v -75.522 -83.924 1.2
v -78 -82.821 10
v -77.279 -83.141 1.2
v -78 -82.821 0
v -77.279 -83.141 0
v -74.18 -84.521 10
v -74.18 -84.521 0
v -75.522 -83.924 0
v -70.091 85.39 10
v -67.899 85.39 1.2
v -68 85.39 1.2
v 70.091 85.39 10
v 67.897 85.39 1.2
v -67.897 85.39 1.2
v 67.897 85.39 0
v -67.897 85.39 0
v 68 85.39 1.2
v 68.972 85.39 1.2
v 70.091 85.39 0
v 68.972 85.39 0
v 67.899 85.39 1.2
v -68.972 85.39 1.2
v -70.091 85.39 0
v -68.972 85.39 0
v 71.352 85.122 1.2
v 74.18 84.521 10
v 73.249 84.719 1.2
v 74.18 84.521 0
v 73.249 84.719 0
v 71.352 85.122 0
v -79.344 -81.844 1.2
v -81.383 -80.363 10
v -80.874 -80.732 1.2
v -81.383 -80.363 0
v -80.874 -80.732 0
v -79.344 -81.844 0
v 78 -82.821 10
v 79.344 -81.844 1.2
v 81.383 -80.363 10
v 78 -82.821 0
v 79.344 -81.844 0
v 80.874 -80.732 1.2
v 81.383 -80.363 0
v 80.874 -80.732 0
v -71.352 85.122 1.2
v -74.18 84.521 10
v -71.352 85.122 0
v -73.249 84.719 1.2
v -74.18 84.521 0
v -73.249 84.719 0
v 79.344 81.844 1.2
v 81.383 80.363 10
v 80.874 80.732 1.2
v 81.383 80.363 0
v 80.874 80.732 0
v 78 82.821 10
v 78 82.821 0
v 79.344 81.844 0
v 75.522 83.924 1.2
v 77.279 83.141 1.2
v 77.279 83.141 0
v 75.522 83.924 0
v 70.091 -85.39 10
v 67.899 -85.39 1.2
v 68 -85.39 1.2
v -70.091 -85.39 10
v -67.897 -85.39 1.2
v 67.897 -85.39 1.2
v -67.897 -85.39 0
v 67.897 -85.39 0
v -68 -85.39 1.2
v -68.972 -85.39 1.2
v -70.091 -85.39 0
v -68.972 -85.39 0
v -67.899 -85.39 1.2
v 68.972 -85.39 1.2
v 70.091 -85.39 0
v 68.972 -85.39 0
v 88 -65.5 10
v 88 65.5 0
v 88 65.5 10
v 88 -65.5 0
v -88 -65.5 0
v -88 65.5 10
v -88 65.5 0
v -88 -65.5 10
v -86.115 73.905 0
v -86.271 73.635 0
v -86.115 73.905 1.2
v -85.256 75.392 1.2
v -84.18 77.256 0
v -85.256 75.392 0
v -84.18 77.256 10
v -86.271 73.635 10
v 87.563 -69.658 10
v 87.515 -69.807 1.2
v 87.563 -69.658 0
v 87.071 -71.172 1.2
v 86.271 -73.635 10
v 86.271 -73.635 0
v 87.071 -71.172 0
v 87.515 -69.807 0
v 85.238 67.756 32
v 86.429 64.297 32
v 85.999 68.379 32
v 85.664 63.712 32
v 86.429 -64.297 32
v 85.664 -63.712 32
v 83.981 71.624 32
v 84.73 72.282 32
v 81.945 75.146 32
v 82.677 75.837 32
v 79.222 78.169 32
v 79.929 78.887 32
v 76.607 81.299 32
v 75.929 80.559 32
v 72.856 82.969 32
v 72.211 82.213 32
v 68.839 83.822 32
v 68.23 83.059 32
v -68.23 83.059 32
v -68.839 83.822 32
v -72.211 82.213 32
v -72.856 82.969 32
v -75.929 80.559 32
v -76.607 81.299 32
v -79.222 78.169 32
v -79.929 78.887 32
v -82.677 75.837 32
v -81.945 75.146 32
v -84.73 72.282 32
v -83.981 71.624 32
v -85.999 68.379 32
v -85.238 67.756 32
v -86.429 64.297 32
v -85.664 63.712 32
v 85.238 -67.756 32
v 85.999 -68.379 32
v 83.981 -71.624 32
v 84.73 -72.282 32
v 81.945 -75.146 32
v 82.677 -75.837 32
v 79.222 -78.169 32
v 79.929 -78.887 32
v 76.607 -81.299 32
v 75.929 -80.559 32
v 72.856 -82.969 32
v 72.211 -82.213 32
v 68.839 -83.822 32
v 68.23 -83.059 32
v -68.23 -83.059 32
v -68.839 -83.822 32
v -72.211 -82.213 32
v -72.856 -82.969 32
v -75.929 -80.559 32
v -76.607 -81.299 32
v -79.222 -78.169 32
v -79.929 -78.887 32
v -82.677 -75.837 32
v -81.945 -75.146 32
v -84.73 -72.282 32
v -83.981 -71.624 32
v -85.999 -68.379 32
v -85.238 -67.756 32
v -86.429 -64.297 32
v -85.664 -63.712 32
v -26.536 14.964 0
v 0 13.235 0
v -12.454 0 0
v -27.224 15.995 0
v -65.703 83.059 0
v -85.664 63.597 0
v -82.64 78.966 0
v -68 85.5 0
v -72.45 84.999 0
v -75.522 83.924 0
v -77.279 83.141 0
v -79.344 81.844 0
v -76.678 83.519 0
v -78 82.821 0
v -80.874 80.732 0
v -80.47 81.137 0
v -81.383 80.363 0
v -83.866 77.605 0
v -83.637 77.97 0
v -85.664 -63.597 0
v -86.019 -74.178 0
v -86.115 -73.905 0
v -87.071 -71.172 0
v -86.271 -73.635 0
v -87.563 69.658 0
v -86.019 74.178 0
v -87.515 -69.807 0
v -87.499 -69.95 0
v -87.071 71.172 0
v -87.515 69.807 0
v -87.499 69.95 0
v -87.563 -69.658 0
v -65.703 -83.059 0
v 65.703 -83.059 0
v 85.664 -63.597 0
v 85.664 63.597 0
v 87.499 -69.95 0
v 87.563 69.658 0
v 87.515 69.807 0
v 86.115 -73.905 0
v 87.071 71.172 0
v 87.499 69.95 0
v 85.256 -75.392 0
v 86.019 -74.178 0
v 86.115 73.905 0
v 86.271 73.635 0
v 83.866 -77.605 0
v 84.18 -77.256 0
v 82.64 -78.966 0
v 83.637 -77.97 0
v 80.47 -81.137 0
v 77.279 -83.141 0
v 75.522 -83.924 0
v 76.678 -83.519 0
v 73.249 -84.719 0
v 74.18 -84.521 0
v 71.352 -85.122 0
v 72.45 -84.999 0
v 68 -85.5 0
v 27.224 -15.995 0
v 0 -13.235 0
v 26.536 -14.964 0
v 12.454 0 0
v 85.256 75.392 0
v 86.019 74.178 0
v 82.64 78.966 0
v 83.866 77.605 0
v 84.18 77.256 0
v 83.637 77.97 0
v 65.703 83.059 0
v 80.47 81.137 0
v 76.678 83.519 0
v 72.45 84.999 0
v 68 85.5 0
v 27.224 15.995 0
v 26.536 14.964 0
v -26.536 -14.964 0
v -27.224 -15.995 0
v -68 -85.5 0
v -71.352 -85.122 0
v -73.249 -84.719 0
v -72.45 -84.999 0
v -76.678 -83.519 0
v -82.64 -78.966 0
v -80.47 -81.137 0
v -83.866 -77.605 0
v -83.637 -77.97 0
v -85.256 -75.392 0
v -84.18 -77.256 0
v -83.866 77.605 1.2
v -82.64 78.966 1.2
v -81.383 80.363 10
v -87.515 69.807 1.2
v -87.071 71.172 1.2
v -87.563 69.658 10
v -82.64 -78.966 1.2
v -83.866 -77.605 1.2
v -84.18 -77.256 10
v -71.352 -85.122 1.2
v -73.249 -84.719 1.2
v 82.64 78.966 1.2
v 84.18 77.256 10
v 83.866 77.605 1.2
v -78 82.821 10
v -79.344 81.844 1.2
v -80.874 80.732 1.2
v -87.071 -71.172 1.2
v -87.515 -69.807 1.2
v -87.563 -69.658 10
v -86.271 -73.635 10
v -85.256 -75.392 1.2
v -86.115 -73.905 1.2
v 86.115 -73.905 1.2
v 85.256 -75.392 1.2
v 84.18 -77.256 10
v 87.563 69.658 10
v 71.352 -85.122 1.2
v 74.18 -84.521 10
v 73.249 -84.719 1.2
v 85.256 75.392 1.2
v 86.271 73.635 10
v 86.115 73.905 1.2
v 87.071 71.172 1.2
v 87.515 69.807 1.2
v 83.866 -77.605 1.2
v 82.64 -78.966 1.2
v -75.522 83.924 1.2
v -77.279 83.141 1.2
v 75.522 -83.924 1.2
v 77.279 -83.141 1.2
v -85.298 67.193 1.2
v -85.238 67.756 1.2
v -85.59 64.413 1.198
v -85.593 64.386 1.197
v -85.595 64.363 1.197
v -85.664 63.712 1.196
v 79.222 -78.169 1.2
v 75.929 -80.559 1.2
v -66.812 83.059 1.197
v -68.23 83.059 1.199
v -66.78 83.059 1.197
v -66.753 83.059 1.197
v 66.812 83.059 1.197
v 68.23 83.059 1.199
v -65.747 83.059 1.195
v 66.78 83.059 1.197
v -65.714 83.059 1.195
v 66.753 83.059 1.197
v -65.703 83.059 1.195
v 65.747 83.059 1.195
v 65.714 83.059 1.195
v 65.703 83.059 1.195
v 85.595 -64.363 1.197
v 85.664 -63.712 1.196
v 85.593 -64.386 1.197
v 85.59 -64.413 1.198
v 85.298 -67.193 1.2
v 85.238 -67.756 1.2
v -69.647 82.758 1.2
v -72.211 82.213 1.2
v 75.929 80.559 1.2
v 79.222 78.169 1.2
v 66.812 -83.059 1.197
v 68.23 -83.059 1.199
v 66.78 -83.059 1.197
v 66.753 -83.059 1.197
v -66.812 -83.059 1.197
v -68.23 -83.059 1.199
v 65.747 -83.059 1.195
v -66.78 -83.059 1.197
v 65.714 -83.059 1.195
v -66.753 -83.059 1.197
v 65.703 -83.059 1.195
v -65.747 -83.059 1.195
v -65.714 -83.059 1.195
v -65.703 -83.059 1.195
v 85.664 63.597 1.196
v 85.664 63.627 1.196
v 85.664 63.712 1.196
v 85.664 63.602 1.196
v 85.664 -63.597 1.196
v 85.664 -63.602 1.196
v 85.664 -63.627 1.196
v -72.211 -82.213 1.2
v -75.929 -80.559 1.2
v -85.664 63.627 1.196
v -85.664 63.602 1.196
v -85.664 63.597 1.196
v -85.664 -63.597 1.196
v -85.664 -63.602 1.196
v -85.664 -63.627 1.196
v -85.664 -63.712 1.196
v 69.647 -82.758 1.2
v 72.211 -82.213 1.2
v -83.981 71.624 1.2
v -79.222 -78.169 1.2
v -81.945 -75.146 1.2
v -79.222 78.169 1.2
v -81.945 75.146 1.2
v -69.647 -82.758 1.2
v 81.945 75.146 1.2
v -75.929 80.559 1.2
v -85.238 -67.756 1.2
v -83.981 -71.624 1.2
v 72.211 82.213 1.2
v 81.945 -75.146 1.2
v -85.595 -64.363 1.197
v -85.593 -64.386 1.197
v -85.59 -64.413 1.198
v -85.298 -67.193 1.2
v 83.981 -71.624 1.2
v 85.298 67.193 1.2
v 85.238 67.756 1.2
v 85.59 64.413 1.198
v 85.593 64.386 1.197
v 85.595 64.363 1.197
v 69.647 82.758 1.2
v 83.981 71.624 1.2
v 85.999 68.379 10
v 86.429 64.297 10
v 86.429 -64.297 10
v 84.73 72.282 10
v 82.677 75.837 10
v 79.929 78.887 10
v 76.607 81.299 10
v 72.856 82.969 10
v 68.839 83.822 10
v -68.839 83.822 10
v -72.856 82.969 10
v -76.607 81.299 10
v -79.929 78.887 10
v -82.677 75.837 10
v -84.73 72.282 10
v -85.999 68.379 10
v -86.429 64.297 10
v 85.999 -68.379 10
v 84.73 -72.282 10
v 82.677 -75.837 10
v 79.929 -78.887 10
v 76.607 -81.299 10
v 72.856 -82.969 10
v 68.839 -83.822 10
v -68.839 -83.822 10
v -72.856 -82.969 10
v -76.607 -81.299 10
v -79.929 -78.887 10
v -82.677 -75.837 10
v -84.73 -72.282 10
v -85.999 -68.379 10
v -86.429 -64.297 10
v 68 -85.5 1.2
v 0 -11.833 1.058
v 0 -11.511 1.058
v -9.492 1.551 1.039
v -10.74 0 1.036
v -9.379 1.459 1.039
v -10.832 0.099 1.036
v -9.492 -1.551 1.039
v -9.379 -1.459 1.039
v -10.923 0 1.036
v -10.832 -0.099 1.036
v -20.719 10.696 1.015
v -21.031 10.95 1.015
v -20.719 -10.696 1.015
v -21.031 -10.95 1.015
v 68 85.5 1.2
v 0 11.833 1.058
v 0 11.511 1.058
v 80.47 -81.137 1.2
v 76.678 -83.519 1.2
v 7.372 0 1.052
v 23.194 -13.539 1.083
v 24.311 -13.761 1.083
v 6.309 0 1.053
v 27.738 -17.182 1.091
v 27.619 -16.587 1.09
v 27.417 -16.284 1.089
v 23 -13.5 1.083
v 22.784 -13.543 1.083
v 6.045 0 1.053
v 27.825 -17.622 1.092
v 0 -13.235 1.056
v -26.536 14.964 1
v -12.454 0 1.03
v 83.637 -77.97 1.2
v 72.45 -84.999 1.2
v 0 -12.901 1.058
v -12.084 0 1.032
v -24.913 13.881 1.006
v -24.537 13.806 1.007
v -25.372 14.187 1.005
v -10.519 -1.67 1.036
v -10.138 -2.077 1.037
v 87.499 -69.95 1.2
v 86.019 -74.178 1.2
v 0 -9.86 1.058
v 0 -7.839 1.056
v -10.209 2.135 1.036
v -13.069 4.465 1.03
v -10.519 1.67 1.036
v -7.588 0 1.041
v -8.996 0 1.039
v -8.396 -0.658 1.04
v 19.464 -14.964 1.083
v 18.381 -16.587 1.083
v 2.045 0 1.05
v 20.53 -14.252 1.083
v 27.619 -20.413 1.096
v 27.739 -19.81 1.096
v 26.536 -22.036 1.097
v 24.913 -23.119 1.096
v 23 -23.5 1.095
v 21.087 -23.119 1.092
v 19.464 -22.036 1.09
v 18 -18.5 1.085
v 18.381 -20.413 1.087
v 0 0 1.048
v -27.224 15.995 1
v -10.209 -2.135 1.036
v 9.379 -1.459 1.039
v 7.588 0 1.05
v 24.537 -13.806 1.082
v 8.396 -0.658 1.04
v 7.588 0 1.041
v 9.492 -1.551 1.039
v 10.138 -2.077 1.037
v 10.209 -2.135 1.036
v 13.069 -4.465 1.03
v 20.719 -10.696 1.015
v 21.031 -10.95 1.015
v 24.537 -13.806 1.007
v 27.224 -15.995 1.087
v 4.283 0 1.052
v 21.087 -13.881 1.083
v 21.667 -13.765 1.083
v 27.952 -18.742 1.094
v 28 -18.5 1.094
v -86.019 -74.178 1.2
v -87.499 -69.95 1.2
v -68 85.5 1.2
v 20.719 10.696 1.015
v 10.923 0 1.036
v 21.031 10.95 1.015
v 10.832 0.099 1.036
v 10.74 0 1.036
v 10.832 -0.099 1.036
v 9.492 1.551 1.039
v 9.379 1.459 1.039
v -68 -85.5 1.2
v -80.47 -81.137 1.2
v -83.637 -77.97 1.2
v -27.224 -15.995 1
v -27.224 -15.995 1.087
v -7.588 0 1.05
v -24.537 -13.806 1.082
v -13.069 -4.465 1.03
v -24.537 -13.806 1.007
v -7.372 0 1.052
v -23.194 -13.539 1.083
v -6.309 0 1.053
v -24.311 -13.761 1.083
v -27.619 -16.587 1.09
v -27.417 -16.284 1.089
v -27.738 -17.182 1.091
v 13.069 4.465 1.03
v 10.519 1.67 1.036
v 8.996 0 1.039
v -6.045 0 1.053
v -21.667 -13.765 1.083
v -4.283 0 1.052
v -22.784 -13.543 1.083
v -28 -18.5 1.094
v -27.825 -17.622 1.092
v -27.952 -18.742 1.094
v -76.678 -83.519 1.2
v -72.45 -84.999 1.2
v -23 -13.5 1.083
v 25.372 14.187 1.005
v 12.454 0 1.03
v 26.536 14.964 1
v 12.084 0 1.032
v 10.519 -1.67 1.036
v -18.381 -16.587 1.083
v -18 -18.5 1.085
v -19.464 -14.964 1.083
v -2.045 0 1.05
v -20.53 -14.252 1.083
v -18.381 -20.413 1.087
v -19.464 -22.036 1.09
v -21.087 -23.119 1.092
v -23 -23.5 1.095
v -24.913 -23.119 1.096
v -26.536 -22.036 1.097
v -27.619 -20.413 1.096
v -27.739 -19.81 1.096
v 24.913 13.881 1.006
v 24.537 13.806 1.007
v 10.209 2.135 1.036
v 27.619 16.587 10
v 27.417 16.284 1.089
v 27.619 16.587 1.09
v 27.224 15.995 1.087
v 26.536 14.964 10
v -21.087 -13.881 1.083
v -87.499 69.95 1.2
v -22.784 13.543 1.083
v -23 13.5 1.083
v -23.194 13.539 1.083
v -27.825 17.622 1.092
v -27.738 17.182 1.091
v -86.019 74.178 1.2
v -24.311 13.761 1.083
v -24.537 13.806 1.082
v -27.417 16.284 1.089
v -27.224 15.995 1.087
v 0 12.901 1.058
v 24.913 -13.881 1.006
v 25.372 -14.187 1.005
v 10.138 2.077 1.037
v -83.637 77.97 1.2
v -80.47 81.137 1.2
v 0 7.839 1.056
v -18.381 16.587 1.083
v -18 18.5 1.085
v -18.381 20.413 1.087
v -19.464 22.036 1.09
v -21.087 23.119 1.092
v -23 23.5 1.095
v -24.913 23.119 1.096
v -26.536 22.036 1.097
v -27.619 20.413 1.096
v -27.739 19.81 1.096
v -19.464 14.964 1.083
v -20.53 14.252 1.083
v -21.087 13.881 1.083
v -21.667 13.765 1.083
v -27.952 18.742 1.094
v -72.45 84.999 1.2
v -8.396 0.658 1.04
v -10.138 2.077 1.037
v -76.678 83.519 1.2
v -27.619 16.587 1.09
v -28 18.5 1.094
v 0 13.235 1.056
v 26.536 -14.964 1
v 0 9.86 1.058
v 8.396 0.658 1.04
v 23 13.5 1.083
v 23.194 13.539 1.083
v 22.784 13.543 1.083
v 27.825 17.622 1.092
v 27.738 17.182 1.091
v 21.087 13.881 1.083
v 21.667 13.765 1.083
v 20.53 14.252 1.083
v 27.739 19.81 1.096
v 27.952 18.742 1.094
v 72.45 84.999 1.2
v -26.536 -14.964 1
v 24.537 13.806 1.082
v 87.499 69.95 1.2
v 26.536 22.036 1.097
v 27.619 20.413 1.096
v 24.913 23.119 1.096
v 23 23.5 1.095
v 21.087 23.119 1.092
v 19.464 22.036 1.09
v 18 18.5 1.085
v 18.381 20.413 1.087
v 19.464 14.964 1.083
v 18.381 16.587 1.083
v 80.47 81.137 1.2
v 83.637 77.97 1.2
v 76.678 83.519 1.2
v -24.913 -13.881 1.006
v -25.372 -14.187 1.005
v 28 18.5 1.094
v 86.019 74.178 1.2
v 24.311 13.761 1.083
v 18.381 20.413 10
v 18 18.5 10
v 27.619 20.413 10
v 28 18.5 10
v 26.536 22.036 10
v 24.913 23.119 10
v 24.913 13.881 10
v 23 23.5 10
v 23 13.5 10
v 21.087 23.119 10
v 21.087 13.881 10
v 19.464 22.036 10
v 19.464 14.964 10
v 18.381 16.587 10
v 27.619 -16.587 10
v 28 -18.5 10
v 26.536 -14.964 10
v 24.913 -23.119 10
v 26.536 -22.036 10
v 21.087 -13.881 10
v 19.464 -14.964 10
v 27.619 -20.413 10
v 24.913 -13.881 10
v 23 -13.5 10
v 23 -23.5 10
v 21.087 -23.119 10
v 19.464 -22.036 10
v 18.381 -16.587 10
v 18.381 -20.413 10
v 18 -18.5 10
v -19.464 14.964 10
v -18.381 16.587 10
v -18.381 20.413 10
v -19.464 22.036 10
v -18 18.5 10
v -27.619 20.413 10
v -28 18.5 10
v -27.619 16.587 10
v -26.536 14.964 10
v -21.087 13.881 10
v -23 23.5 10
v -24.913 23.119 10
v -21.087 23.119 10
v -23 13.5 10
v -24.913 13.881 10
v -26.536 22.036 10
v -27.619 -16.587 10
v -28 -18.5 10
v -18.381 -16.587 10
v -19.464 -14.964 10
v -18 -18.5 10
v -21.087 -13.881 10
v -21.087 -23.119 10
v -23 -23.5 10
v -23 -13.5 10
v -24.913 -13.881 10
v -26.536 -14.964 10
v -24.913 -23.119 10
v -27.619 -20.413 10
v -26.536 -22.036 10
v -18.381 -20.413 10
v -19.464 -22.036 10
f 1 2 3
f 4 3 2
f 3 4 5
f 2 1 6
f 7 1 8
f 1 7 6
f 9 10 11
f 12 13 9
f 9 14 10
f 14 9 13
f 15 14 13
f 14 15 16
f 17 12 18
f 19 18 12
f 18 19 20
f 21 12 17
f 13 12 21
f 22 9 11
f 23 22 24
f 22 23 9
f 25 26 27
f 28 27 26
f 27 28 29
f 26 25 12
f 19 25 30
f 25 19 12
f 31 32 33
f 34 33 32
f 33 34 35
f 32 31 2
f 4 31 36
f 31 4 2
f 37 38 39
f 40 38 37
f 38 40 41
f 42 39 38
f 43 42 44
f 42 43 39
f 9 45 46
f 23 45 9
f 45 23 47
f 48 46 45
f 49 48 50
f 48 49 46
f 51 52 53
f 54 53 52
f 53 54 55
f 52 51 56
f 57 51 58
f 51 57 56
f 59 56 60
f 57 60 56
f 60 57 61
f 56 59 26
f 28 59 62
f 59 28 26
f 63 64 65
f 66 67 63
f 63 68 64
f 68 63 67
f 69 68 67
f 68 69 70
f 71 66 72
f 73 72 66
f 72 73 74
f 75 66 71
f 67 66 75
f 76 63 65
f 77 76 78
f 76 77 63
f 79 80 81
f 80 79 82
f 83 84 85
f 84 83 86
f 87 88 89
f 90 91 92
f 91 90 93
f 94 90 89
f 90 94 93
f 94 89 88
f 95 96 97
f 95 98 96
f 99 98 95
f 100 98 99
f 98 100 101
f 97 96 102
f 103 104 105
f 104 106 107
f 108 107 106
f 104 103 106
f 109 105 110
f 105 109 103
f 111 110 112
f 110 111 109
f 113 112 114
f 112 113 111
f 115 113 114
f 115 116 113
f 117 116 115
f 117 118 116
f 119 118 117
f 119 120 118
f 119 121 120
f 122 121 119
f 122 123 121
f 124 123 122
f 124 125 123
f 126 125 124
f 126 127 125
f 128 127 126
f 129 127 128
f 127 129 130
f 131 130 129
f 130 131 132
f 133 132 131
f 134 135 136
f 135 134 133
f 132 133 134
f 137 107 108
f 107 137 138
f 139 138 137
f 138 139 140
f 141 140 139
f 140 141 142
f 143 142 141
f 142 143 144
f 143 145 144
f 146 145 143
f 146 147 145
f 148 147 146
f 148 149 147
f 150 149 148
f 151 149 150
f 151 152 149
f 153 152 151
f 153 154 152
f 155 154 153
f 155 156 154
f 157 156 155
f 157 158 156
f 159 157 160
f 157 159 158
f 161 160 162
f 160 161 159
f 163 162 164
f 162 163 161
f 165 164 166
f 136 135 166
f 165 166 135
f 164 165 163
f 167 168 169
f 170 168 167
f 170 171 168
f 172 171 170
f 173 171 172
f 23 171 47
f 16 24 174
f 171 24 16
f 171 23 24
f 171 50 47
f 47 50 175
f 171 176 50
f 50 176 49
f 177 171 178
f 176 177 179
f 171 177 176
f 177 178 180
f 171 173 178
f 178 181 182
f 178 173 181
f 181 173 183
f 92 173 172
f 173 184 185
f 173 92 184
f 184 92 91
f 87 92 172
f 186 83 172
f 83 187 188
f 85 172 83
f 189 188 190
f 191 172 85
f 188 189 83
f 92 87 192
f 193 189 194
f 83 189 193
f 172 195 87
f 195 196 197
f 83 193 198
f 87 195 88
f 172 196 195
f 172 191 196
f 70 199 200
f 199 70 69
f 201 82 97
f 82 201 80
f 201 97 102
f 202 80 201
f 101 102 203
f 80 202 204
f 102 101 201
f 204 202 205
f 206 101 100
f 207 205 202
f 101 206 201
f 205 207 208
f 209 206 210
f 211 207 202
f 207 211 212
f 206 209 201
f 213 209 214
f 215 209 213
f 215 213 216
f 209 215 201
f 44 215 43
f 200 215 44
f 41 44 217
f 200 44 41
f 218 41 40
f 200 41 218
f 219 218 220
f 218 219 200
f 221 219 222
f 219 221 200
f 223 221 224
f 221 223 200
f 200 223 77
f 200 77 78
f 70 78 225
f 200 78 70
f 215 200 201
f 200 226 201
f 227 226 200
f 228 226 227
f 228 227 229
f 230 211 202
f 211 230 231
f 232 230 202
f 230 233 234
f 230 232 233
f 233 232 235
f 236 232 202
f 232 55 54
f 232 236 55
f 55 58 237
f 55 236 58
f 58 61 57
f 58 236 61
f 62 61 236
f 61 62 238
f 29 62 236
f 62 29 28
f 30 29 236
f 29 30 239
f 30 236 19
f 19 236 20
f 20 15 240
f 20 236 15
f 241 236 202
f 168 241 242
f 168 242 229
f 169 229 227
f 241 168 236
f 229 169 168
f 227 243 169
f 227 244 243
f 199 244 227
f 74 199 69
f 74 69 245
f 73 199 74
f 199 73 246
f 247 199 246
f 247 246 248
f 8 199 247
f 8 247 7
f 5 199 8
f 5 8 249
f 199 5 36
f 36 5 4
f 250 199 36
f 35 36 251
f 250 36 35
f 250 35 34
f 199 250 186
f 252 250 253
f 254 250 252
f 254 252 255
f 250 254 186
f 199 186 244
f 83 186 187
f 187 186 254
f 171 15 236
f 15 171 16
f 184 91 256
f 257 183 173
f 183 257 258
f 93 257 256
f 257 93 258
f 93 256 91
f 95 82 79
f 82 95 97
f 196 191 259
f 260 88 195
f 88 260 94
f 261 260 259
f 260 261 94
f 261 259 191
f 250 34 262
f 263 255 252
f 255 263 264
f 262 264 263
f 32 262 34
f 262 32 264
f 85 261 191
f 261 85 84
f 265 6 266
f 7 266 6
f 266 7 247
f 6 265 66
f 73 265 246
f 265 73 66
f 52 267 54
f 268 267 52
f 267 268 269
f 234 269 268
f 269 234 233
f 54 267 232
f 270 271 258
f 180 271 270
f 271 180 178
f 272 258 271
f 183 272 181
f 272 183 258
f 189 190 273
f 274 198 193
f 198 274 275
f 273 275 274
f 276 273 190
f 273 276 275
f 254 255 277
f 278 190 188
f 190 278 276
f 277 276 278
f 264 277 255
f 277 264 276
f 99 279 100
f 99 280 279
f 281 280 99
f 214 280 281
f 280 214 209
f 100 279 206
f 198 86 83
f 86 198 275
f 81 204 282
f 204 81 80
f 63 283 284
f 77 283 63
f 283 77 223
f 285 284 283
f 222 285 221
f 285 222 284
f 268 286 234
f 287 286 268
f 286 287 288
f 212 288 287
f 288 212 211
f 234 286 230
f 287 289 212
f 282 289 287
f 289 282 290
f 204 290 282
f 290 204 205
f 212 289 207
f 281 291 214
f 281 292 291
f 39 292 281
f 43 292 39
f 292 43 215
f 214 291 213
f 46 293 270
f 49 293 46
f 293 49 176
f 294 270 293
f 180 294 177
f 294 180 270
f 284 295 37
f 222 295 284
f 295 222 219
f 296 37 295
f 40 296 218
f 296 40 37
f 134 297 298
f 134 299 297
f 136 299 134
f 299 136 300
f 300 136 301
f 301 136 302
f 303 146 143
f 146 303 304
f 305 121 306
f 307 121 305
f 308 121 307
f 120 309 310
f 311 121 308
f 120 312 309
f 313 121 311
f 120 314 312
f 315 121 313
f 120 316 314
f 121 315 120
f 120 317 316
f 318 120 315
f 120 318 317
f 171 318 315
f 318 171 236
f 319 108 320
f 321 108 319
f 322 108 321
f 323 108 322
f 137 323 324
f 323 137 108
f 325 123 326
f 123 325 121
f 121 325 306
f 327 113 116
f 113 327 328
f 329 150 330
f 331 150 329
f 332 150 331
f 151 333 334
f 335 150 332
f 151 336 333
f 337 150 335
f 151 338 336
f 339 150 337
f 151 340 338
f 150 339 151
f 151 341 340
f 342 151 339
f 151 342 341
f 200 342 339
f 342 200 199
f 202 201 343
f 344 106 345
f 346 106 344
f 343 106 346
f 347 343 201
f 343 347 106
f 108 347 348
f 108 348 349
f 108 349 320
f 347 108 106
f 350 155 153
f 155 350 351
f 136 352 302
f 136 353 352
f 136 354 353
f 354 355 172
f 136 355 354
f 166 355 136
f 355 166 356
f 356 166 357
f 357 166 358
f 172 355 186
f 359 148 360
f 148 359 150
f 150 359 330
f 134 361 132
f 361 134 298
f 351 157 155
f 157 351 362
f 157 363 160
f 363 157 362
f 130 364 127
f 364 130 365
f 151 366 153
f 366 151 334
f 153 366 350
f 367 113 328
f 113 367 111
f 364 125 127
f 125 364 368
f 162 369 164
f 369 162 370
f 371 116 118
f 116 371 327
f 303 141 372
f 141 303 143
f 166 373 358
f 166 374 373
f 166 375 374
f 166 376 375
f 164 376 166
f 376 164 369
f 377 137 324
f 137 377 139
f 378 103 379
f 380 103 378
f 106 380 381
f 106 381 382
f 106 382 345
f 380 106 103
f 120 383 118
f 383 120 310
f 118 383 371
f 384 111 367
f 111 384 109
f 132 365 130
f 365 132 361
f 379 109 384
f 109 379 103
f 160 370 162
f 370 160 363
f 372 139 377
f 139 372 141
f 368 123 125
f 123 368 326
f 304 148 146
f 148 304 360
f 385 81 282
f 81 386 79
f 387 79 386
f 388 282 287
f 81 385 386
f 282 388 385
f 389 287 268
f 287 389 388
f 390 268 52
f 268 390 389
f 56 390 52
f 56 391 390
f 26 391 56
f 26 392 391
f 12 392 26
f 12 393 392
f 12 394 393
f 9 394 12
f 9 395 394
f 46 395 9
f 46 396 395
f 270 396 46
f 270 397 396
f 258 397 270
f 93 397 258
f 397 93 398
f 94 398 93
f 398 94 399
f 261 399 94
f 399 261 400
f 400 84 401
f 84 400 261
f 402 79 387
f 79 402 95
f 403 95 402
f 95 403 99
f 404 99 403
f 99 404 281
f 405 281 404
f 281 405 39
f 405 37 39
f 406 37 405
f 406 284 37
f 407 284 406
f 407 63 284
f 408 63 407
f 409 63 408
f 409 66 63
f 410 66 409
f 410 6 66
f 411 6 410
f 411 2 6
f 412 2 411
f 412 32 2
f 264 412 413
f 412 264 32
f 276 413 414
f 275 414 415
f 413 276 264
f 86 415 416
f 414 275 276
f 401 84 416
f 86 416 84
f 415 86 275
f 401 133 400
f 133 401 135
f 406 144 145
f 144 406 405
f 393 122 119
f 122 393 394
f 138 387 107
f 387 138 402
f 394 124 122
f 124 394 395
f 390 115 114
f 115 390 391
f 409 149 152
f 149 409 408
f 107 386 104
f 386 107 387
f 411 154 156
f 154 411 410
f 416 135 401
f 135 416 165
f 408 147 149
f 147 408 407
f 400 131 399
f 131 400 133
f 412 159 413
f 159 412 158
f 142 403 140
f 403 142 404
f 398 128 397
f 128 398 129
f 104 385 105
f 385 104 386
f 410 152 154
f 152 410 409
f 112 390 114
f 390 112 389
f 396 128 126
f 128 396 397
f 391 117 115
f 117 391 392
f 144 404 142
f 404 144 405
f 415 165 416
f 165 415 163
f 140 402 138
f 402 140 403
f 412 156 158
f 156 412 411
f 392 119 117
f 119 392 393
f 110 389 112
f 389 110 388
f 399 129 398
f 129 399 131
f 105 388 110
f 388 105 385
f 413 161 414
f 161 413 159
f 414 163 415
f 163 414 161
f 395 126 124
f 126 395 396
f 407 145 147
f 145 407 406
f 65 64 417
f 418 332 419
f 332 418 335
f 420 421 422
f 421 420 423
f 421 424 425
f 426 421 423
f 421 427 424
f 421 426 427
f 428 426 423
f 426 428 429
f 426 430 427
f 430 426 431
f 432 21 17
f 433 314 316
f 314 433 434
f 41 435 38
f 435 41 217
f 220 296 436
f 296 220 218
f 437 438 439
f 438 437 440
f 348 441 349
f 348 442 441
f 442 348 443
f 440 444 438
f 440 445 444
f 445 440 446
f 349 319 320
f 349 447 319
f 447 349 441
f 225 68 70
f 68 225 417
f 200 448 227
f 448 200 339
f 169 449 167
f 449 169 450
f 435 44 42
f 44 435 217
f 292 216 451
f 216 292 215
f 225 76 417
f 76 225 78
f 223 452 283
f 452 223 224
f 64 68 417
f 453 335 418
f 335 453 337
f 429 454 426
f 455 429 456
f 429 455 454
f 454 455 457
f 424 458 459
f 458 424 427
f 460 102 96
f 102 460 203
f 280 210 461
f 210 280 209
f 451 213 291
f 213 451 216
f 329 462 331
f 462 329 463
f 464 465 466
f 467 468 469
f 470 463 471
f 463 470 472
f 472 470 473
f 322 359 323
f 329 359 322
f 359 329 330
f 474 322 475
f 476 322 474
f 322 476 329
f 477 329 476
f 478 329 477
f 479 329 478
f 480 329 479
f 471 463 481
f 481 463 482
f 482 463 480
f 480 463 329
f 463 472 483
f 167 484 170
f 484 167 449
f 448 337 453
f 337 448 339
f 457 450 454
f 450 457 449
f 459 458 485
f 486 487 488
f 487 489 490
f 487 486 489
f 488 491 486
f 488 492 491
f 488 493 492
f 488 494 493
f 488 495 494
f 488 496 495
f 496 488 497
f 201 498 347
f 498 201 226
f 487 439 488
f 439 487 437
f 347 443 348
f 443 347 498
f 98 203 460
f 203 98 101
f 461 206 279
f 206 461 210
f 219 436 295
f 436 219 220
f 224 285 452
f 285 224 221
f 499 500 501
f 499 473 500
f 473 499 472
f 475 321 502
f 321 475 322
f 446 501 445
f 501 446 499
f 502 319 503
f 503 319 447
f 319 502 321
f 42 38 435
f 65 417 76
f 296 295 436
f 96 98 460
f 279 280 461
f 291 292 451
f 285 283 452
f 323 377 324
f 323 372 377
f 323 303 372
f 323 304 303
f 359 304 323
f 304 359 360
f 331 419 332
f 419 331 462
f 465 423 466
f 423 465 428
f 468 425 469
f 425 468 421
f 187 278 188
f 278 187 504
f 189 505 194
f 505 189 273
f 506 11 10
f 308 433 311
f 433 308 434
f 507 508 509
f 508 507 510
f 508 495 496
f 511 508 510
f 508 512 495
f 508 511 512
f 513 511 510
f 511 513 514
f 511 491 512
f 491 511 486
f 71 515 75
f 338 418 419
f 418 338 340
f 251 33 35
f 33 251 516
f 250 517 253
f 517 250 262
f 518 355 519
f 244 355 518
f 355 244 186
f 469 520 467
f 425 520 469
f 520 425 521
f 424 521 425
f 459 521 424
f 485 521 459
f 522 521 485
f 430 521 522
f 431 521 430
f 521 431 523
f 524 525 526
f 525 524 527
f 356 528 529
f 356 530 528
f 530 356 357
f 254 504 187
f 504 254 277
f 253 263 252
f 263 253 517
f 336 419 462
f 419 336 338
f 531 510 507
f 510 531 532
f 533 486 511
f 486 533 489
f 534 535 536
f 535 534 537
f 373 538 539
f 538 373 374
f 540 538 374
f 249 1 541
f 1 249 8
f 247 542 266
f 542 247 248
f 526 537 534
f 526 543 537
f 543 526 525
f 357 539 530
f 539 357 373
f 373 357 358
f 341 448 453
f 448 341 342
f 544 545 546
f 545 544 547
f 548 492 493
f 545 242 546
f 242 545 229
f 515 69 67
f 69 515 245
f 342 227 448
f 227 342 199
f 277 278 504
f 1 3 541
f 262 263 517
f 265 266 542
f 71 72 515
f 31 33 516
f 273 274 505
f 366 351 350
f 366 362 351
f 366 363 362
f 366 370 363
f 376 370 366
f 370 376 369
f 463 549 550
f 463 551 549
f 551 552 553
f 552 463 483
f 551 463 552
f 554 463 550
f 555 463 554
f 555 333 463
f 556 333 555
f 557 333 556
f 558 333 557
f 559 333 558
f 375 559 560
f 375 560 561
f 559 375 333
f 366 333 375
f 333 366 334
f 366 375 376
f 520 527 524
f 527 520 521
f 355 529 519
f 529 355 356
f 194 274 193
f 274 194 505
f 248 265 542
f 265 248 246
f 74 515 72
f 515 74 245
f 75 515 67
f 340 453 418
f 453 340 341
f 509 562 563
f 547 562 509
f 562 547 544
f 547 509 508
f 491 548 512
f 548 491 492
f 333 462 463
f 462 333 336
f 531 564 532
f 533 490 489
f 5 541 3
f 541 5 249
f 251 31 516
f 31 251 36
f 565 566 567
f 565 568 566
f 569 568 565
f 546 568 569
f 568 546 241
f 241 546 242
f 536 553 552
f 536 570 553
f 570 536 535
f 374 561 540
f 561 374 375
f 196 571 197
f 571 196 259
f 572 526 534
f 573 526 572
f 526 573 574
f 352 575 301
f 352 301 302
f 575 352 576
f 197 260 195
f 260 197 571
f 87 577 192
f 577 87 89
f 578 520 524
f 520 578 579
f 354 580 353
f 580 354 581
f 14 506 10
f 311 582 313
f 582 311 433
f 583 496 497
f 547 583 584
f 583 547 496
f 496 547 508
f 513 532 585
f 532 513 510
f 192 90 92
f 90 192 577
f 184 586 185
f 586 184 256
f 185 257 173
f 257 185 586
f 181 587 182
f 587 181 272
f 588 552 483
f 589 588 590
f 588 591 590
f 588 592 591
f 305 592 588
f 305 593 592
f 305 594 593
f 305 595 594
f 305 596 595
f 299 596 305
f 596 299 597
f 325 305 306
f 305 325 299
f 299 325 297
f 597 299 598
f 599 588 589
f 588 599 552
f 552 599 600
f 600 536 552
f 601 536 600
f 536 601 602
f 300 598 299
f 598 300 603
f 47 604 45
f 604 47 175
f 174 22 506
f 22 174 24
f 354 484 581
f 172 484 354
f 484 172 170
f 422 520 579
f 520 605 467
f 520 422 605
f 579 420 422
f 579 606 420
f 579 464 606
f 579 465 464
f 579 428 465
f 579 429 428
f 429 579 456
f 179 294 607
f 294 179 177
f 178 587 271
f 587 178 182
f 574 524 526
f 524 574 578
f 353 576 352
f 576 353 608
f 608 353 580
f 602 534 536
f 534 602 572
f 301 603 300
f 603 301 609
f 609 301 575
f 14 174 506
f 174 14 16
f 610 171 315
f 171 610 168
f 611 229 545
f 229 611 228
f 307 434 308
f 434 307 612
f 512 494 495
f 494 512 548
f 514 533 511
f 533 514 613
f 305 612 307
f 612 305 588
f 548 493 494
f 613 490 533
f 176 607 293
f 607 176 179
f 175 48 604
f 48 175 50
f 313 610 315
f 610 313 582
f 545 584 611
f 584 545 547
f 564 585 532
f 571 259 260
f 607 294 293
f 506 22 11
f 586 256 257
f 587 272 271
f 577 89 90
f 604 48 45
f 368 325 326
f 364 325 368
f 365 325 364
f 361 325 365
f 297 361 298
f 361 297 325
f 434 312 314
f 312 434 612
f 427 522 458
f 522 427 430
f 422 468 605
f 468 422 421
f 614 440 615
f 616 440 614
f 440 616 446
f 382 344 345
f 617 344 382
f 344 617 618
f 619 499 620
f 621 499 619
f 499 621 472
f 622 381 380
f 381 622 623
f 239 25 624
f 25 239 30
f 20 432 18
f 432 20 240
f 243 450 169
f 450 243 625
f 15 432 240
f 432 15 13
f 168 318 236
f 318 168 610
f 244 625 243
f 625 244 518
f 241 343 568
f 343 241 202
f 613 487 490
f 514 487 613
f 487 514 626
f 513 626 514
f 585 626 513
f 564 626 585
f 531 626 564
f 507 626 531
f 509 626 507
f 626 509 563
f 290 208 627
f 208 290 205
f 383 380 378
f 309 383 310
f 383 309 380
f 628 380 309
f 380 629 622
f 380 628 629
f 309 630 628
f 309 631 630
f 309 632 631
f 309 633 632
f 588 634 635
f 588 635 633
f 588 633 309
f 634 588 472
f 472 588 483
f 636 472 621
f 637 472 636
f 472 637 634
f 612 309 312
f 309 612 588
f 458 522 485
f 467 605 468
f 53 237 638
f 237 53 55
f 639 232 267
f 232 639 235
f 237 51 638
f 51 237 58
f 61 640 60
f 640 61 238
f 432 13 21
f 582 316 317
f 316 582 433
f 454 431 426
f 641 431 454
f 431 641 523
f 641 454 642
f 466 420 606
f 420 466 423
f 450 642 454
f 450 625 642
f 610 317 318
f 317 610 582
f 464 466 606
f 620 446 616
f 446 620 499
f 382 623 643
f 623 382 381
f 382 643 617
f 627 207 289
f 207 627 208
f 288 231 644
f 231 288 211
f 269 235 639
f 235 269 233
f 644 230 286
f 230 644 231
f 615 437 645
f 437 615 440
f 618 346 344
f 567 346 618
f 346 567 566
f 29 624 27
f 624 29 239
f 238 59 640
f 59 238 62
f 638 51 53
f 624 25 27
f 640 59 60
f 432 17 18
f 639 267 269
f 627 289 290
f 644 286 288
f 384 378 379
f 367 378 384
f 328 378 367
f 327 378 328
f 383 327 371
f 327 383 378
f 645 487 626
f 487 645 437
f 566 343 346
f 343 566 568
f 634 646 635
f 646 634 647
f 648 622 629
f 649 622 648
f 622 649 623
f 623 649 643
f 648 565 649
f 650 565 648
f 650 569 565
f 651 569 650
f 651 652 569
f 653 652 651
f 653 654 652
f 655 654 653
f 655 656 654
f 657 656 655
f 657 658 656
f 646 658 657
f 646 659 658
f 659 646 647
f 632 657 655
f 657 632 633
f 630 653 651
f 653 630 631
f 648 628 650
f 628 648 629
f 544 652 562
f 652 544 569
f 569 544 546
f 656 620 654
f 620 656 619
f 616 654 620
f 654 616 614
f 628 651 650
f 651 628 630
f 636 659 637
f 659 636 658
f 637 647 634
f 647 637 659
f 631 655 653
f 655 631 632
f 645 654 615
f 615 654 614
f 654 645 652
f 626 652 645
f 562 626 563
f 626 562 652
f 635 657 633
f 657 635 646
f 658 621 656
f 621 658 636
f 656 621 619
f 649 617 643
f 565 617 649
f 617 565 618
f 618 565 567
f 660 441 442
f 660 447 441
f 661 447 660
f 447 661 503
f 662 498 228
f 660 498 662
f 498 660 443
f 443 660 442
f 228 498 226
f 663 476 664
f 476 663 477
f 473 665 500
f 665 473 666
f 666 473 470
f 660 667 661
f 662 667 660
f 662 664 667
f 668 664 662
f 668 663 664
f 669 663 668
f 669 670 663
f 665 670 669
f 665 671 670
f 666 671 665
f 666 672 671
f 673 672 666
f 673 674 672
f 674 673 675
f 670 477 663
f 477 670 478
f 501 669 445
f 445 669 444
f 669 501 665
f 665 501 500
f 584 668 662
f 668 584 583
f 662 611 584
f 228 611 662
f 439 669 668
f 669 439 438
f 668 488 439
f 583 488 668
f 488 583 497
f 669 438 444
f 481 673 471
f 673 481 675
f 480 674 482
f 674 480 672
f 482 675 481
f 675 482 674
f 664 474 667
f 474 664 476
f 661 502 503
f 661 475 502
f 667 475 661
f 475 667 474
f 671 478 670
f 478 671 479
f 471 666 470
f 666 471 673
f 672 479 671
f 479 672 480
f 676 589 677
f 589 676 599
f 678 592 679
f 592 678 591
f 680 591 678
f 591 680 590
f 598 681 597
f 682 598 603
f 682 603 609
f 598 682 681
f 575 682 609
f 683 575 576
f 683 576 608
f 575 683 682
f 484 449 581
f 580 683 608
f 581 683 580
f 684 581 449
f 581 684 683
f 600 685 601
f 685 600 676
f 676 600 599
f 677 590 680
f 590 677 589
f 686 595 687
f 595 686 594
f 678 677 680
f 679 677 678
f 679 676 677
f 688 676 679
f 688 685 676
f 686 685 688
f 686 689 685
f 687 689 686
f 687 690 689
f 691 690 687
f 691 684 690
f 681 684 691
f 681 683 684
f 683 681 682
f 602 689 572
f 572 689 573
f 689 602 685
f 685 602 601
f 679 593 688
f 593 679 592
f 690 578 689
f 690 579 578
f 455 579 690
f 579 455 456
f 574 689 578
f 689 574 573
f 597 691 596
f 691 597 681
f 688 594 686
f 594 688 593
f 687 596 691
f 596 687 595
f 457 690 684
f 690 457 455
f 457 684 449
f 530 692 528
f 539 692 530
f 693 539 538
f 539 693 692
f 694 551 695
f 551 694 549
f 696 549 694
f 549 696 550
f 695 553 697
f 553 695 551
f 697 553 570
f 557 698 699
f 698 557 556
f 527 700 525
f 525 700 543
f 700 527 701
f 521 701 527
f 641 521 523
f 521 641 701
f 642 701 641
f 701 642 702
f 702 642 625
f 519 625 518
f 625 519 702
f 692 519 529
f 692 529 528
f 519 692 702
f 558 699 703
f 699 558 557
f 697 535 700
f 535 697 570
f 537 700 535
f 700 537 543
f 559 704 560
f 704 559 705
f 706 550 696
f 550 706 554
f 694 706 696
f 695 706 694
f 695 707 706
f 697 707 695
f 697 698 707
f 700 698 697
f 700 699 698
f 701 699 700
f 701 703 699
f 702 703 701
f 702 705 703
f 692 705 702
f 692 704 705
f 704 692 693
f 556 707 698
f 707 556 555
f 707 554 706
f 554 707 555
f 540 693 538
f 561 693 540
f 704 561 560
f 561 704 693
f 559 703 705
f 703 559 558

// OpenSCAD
bot_h = 25;

core_w = 32;
height = 32;
props_r = 38;
space_x = 110 - 10;
space_y = 85 + 10;

corner_r = 20;
corner_a = 90;

thickness = 1.2;

total_width = props_r * 2 + space_x;
total_height = props_r * 2 + space_y;

echo("total_width: ", total_width);
echo("total_height: ", total_height);

module box() {
  translate([-space_x / 2, -space_y / 2, 0]) {
    hull() {
      translate([0, 0, 0]) {
        cylinder(h = height, r = props_r);
        translate([-props_r + corner_r, -props_r + corner_r, 0]) {
          cylinder(h = height, r = corner_r);
        }
      }
      translate([space_x, 0, 0]) {
        cylinder(h = height, r = props_r);
        translate([props_r - corner_r, -props_r + corner_r, 0]) {
          cylinder(h = height, r = corner_r);
        }
      }
      translate([0, space_y, 0]) {
        cylinder(h = height, r = props_r);
        translate([-props_r + corner_r, props_r - corner_r, 0]) {
          cylinder(h = height, r = corner_r);
        }
      }
      translate([space_x, space_y, 0]) {
        cylinder(h = height, r = props_r);
        translate([props_r - corner_r, props_r - corner_r, 0]) {
          cylinder(h = height, r = corner_r);
        }
      }
    }
  }
}

module open_box(t = 1) {
  x_factor = (total_width * 100) / (total_width + t * 2) / 100;
  y_factor = (total_height * 100) / (total_height + t * 2) / 100;

  echo("x_factor: ", x_factor);
  echo("y_factor: ", y_factor);

  difference() {
    box();
    scale([x_factor, y_factor, 1]) {
      box();
    }
  }
}

module pieEdge(a, r, h, rot = 0) {
  difference() {
    pieSlice(a, r, h, rot);
    cylinder(h = h, r = r - 1);
  }
}

module pieSlice(a, r, h, rot = 0) {
  // a:angle, r:radius, h:height
  rotate(rot, [0, 0, 1]) {
    rotate_extrude(angle = a) {
      square([r, h]);
    }
  }
}

module core() {
  core_lock_r = 7;
  core_lock_h = 10;
  enforcer_shift = 20;
  core_lock2_r = 3;

  translate([-core_w / 2, -total_height / 2 + thickness, 0]) {
    cube([core_w, total_height - thickness - 55, thickness]);
  }

  module backtocenter() {
    translate([space_x / 2, space_y / 2, 0]) {
      cylinder(h = thickness, r = 5);
    }
  }
  cylinder(h = thickness, r = core_w / 2);
  cylinder(h = core_lock_h, r = core_lock_r);
  translate([0, 24, 0]) {
    cylinder(h = core_lock_h, r = core_lock2_r);
  }
  translate([0, -24, 0]) {
    cylinder(h = core_lock_h, r = core_lock2_r);
  }
  translate([-space_x / 2, -space_y / 2, 0]) {
    hull() {
      translate([0, -enforcer_shift, 0]) {
        backtocenter();
      }
      translate([space_x, 0, 0]) {
        translate([props_r - corner_r, -props_r + corner_r, 0]) {
          pieEdge(a = corner_a, rot = 270 + (90 - corner_a) / 2, h = thickness, r = corner_r);
        }
      }
      // }
      // hull() {
      translate([0, -enforcer_shift, 0]) {
        backtocenter();
      }
      translate([0, 0, 0]) {
        translate([-props_r + corner_r, -props_r + corner_r, 0]) {
          pieEdge(a = corner_a, rot = 180 + (90 - corner_a) / 2, h = thickness, r = corner_r);
        }
      }
      // }
      // hull() {
      translate([0, enforcer_shift, 0]) {
        backtocenter();
      }
      translate([0, space_y, 0]) {
        translate([-props_r + corner_r, props_r - corner_r, 0]) {
          pieEdge(a = corner_a, rot = 90 + (90 - corner_a) / 2, h = thickness, r = corner_r);
        }
      }
      // }
      // hull() {
      translate([0, enforcer_shift, 0]) {
        backtocenter();
      }
      translate([space_x, space_y, 0]) {
        translate([props_r - corner_r, props_r - corner_r, 0]) {
          pieEdge(a = corner_a, rot = 0 + (90 - corner_a) / 2, h = thickness, r = corner_r);
        }
      }
    }
  }
}

module core_bot() {
  core_lock_r = 5;
  core_lock_h = 10;
  shift1 = 46 / 2;
  shift2 = 37 / 2;

  translate([shift1, shift2, 0]) {
    cylinder(h = core_lock_h, r = core_lock_r);
  }
  translate([shift1, -shift2, 0]) {
    cylinder(h = core_lock_h, r = core_lock_r);
  }
  translate([-shift1, shift2, 0]) {
    cylinder(h = core_lock_h, r = core_lock_r);
  }
  translate([-shift1, -shift2, 0]) {
    cylinder(h = core_lock_h, r = core_lock_r);
  }

  // dowyjebbania

  translate([-space_x / 2, -space_y / 2, 0]) {
    hull() {
      translate([space_x, 0, 0]) {
        translate([props_r - corner_r, -props_r + corner_r, 0]) {
          pieEdge(a = corner_a, rot = 270 + (90 - corner_a) / 2, h = thickness, r = corner_r);
        }
      }
      translate([space_x / 2, space_y / 2, 0]) {
        translate([-shift1, shift2, 0]) {
          cylinder(h = 1, r = core_lock_r);
        }
      }
    }
    hull() {
      translate([0, 0, 0]) {
        translate([-props_r + corner_r, -props_r + corner_r, 0]) {
          pieEdge(a = corner_a, rot = 180 + (90 - corner_a) / 2, h = thickness, r = corner_r);
        }
      }
      translate([space_x / 2, space_y / 2, 0]) {
        translate([shift1, shift2, 0]) {
          cylinder(h = 1, r = core_lock_r);
        }
      }
    }
    hull() {
      translate([0, space_y, 0]) {
        translate([-props_r + corner_r, props_r - corner_r, 0]) {
          pieEdge(a = corner_a, rot = 90 + (90 - corner_a) / 2, h = thickness, r = corner_r);
        }
      }
      translate([space_x / 2, space_y / 2, 0]) {
        translate([shift1, -shift2, 0]) {
          cylinder(h = 1, r = core_lock_r);
        }
      }
    }
    hull() {
      translate([space_x, space_y, 0]) {
        translate([props_r - corner_r, props_r - corner_r, 0]) {
          pieEdge(a = corner_a, rot = 0 + (90 - corner_a) / 2, h = thickness, r = corner_r);
        }
      }
      translate([space_x / 2, space_y / 2, 0]) {
        translate([-shift1, -shift2, 0]) {
          cylinder(h = 1, r = core_lock_r);
        }
      }
    }
  }

  // REAL BOTTOM
  // translate([-space_x / 2, -space_y / 2, 0]) {
  //   hull() {
  //     translate([space_x, 0, 0]) {
  //       translate([props_r - corner_r, -props_r + corner_r, 0]) {
  //         pieEdge(a = corner_a, rot = 270 + (90 - corner_a) / 2, h = thickness, r = corner_r);
  //       }
  //     }
  //     translate([0, 0, 0]) {
  //       translate([-props_r + corner_r, -props_r + corner_r, 0]) {
  //         pieEdge(a = corner_a, rot = 180 + (90 - corner_a) / 2, h = thickness, r = corner_r);
  //       }
  //     }
  //     translate([0, space_y, 0]) {
  //       translate([-props_r + corner_r, props_r - corner_r, 0]) {
  //         pieEdge(a = corner_a, rot = 90 + (90 - corner_a) / 2, h = thickness, r = corner_r);
  //       }
  //     }
  //     translate([space_x, space_y, 0]) {
  //       translate([props_r - corner_r, props_r - corner_r, 0]) {
  //         pieEdge(a = corner_a, rot = 0 + (90 - corner_a) / 2, h = thickness, r = corner_r);
  //       }
  //     }
  //   }
  // }
}

module box_bot() {
  bot_t = thickness + 1.2;
  difference() {
    open_box(bot_t);
    translate([0, 0, 10]) {
      open_box(thickness + 0.4);
    }
  }
}

render() {
  box_bot();
  core_bot();
}

// Top
// render() {
//   core();
//   open_box(thickness);
// }
